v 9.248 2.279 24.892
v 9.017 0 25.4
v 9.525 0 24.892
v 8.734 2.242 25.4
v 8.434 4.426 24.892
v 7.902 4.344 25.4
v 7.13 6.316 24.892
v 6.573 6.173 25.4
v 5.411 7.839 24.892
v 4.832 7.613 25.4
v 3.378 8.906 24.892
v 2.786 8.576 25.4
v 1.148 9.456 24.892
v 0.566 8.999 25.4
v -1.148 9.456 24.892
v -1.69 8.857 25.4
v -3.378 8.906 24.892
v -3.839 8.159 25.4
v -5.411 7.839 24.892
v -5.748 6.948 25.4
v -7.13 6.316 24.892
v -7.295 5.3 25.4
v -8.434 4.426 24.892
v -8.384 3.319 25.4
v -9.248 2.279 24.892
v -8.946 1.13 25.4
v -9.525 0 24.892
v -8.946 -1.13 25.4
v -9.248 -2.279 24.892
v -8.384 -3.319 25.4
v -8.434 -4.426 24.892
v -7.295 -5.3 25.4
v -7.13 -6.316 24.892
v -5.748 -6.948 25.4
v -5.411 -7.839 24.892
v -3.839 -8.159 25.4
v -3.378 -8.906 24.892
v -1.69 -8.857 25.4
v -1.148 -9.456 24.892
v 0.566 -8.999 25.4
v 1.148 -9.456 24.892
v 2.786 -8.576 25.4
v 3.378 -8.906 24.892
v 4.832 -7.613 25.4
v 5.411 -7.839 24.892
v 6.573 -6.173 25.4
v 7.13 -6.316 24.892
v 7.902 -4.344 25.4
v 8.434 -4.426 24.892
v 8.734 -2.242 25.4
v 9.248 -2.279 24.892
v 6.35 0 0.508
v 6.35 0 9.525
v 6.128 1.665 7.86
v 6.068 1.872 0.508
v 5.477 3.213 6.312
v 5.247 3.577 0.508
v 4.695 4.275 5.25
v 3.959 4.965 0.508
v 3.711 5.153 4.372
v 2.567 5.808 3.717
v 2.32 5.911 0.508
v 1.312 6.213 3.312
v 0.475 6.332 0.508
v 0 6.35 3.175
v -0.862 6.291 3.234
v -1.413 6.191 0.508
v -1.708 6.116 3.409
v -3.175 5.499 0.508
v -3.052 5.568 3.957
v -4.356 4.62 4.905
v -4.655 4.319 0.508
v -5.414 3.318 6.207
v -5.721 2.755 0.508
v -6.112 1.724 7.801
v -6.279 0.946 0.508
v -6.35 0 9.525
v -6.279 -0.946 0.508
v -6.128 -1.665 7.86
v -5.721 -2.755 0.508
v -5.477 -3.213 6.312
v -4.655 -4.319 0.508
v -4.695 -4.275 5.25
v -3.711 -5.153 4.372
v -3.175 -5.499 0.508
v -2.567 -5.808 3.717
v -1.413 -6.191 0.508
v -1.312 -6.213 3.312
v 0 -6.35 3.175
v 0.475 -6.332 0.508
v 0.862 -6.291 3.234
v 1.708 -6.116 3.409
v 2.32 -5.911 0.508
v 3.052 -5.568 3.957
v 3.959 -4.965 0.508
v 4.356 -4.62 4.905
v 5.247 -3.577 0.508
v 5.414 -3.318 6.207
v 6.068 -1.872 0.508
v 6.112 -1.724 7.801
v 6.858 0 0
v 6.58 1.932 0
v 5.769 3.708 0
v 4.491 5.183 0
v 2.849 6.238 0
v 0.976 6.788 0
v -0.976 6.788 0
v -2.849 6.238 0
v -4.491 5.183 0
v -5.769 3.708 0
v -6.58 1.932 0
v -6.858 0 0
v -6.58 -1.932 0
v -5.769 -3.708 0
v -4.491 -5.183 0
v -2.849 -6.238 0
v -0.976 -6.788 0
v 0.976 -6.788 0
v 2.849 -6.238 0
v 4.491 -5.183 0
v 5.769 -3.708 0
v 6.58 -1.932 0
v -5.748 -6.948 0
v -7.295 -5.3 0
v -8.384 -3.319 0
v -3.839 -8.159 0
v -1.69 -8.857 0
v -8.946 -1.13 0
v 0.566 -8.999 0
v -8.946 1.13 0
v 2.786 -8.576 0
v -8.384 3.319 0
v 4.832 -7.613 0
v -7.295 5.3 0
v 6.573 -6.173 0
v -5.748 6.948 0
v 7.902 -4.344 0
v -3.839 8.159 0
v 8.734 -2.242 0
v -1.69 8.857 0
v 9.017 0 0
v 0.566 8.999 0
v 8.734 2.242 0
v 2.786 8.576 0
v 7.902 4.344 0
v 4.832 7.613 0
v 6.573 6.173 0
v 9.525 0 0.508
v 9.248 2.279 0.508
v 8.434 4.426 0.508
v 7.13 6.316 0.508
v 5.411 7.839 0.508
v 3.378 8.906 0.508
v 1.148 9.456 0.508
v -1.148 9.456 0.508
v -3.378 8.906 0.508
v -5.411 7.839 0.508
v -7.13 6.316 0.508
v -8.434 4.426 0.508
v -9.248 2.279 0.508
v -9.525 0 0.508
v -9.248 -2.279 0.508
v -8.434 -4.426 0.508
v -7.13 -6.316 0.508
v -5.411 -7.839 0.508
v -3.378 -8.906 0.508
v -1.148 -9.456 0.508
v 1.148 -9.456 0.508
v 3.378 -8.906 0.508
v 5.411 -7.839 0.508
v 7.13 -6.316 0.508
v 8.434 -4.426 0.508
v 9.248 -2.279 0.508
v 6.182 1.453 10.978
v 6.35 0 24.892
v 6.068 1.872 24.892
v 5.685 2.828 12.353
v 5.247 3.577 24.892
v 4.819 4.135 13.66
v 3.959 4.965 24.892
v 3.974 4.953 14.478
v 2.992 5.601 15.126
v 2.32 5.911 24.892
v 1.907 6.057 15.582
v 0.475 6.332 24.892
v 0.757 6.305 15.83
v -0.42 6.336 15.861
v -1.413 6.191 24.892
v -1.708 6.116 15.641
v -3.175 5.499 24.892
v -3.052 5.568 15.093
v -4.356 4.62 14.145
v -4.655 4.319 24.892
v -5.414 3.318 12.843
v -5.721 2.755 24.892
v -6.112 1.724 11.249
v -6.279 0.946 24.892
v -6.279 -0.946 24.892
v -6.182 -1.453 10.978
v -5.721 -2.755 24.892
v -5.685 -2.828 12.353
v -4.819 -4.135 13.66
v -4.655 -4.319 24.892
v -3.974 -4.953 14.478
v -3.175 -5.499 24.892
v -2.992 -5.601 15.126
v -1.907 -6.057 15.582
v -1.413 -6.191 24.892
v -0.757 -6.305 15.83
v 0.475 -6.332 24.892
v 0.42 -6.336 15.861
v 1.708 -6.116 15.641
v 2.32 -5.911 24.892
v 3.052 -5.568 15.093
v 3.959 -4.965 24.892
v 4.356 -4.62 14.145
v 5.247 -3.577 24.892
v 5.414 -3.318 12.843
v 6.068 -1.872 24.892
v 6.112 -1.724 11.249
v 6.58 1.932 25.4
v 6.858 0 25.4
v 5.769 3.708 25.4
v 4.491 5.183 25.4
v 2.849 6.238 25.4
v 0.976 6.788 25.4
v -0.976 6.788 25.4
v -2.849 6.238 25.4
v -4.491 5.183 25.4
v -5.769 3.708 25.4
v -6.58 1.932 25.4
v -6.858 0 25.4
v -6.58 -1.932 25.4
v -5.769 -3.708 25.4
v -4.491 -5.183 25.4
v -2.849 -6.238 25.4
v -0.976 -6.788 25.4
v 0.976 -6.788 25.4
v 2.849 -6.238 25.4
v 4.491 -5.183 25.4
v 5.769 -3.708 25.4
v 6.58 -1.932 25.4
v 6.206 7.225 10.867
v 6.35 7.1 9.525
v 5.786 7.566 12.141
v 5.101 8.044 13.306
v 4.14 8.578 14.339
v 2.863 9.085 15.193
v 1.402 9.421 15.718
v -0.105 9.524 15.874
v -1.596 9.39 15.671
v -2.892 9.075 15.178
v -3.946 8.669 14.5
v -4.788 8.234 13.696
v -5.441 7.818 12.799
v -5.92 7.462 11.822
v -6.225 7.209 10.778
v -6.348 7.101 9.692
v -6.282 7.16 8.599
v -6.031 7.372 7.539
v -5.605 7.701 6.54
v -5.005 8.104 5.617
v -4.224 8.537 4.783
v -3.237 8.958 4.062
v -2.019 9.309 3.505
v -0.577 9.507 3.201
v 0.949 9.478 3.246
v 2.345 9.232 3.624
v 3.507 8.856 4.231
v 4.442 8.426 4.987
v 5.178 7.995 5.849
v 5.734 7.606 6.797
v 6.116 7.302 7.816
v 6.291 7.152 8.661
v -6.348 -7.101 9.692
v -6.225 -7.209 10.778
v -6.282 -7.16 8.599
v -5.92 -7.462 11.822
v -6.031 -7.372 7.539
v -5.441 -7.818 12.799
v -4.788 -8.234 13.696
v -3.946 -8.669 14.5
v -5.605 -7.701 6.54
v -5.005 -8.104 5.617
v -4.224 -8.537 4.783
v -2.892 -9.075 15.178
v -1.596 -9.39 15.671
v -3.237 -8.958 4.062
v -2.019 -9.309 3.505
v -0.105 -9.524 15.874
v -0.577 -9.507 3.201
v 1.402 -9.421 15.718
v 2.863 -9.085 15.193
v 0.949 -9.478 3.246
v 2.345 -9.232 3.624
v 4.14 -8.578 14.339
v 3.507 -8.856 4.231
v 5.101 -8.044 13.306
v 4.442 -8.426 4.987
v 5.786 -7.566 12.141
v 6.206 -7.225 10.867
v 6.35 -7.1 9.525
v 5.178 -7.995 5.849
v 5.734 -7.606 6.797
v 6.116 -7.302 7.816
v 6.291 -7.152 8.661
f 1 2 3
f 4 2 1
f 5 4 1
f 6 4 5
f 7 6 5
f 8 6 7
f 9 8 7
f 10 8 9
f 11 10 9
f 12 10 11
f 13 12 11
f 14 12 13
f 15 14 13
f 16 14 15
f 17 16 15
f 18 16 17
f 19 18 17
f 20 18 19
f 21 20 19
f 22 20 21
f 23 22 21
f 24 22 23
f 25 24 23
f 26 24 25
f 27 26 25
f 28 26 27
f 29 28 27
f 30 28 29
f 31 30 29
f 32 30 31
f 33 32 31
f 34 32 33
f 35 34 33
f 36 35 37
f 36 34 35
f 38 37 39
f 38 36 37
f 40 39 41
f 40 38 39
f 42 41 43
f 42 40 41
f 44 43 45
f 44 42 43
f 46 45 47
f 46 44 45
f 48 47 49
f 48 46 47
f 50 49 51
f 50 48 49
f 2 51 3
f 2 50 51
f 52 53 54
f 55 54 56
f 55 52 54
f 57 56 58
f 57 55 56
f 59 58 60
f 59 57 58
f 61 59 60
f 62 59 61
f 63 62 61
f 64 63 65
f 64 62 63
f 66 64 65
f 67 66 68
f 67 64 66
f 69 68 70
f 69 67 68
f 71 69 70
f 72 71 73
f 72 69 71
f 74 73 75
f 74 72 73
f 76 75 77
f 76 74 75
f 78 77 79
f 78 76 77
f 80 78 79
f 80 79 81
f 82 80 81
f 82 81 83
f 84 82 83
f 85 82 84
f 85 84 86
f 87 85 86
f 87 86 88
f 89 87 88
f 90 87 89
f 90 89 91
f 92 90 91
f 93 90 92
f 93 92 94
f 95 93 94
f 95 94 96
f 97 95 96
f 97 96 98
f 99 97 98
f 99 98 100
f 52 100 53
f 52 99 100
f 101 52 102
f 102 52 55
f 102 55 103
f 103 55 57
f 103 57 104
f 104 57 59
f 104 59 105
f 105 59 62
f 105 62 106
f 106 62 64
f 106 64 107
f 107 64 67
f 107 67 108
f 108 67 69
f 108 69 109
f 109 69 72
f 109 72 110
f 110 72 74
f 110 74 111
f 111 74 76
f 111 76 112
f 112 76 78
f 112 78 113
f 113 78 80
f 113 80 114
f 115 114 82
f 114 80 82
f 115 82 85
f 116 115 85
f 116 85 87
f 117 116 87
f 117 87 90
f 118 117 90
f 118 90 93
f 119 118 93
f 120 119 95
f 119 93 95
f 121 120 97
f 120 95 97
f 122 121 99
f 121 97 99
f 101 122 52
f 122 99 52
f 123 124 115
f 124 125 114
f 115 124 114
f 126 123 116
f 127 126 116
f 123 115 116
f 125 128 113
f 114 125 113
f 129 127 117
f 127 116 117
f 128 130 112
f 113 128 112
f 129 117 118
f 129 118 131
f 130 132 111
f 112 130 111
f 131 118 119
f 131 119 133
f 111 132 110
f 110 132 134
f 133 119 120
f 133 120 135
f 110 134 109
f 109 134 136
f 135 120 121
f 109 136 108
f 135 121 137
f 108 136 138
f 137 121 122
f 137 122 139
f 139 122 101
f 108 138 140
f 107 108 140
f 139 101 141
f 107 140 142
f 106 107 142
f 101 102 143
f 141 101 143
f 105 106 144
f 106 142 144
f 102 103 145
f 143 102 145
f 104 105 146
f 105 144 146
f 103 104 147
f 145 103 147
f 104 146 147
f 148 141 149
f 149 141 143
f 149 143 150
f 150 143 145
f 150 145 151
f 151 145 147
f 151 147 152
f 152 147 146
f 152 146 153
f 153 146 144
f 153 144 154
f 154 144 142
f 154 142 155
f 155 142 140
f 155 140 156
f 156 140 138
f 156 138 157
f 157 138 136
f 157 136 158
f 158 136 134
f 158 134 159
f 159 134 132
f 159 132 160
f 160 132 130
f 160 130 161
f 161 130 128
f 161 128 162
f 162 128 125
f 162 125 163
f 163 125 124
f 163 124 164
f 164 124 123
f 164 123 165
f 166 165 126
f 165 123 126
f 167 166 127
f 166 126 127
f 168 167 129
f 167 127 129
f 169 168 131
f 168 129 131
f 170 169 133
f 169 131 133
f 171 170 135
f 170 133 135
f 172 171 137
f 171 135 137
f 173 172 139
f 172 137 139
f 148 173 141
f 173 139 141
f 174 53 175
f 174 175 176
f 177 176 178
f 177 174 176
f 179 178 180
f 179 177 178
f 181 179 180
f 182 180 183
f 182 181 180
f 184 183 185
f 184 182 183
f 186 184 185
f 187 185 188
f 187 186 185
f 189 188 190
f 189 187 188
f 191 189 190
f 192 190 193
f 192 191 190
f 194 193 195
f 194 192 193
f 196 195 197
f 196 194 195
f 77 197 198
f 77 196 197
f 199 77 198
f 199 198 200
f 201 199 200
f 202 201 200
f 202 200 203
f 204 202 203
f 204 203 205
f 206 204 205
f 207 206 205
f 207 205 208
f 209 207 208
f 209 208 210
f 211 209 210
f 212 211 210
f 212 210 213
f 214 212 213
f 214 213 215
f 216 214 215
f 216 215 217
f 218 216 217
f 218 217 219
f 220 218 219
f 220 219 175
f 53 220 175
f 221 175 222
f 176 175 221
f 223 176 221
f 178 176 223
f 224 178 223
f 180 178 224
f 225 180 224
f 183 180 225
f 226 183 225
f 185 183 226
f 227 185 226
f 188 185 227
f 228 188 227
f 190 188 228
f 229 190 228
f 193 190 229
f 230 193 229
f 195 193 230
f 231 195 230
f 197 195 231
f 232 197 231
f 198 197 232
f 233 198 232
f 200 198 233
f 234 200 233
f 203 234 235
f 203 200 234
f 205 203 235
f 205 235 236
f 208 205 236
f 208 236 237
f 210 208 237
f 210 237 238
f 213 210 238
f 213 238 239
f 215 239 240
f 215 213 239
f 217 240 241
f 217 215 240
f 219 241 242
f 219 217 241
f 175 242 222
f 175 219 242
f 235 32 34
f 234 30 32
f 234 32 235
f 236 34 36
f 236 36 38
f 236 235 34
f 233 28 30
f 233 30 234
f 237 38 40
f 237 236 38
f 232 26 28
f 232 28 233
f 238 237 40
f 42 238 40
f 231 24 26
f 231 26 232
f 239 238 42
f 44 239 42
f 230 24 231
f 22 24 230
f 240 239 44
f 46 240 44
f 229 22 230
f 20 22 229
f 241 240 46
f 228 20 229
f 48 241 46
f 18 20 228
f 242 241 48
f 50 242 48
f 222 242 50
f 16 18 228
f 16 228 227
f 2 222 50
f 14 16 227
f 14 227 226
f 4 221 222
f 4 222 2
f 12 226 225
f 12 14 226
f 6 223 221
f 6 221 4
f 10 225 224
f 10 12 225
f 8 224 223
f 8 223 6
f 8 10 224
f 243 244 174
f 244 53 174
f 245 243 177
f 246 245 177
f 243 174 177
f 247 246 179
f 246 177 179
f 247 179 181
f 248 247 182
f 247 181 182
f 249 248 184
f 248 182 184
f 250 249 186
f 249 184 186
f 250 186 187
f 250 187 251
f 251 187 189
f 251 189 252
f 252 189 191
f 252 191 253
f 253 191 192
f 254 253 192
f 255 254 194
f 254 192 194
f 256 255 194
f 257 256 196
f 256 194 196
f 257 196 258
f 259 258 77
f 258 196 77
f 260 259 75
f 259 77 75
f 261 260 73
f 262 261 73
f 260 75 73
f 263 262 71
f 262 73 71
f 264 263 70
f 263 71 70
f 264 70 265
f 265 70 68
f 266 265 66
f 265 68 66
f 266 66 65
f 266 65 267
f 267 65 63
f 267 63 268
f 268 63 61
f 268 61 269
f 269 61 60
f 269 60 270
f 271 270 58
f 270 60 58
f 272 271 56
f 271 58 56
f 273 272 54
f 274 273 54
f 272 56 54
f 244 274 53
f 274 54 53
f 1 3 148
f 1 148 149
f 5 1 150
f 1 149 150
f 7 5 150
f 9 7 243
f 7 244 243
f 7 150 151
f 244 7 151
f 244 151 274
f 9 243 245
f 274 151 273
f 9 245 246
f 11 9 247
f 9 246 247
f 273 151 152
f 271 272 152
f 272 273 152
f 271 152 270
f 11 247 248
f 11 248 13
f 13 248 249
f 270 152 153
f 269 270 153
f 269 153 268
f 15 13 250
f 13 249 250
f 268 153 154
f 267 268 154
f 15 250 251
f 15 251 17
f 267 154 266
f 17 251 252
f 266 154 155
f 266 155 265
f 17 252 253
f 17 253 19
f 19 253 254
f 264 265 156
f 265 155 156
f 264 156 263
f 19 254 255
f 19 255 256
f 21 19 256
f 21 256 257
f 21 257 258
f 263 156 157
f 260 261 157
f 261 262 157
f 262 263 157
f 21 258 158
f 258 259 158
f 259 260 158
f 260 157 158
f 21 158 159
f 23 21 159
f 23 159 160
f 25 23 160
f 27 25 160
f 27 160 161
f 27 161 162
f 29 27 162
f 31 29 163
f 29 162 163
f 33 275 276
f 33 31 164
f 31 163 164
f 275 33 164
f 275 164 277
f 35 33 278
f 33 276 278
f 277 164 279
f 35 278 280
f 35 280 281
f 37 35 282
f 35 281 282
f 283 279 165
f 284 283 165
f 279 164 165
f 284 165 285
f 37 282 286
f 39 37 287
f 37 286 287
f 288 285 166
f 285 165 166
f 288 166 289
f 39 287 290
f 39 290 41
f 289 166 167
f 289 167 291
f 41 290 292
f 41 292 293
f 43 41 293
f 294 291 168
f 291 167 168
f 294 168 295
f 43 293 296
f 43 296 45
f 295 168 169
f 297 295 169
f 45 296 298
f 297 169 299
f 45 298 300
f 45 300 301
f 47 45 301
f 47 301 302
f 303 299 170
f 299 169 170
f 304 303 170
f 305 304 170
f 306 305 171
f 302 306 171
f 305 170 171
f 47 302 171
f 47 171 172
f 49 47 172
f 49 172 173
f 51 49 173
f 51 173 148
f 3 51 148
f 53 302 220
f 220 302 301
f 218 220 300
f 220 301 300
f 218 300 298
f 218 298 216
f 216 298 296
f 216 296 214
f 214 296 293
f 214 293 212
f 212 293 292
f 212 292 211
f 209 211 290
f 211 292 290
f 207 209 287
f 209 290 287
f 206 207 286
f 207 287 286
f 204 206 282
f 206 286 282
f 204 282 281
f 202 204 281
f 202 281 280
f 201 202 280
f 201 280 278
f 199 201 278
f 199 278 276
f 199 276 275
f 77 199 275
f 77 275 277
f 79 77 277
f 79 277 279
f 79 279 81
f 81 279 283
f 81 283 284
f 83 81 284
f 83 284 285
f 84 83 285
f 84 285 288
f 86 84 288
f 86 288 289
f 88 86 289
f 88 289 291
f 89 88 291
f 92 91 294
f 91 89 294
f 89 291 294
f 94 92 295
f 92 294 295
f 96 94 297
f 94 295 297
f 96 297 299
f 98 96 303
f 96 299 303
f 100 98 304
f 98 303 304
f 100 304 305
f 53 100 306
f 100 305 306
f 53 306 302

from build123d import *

# Parameters (mm, degrees)
F0_R     = 9.525
F0_R_2   = 6.35
F1_DEPTH = 25.4
F3_DEPTH = 12.7
F4_SIZE  = 0.508


with BuildPart() as f1:
    # F0 (on Top) → F1 (new body)
    with BuildSketch(Plane.XY):
        Circle(F0_R)
        Circle(F0_R_2, mode=Mode.SUBTRACT)
    extrude(amount=F1_DEPTH)

    # F2 (on Front) → F3 (cut, symmetric)
    with BuildSketch(Plane.XZ):
        with BuildLine():
            ThreePointArc((-6.35, 9.525), (0, 3.175), (6.35, 9.525))
            ThreePointArc((6.35, 9.525), (0, 15.875), (-6.35, 9.525))
        make_face()
    extrude(amount=F3_DEPTH, both=True, mode=Mode.SUBTRACT)

    # F4
    f4_edges = [f1.edges().sort_by_distance(p)[0] for p in [
        (-6.35, 0, 25.4),
        (-9.525, 0, 25.4),
        (-6.35, 0, 0),
        (-9.525, 0, 0),
    ]]
    chamfer(f4_edges, length=F4_SIZE)


solid = f1.part
